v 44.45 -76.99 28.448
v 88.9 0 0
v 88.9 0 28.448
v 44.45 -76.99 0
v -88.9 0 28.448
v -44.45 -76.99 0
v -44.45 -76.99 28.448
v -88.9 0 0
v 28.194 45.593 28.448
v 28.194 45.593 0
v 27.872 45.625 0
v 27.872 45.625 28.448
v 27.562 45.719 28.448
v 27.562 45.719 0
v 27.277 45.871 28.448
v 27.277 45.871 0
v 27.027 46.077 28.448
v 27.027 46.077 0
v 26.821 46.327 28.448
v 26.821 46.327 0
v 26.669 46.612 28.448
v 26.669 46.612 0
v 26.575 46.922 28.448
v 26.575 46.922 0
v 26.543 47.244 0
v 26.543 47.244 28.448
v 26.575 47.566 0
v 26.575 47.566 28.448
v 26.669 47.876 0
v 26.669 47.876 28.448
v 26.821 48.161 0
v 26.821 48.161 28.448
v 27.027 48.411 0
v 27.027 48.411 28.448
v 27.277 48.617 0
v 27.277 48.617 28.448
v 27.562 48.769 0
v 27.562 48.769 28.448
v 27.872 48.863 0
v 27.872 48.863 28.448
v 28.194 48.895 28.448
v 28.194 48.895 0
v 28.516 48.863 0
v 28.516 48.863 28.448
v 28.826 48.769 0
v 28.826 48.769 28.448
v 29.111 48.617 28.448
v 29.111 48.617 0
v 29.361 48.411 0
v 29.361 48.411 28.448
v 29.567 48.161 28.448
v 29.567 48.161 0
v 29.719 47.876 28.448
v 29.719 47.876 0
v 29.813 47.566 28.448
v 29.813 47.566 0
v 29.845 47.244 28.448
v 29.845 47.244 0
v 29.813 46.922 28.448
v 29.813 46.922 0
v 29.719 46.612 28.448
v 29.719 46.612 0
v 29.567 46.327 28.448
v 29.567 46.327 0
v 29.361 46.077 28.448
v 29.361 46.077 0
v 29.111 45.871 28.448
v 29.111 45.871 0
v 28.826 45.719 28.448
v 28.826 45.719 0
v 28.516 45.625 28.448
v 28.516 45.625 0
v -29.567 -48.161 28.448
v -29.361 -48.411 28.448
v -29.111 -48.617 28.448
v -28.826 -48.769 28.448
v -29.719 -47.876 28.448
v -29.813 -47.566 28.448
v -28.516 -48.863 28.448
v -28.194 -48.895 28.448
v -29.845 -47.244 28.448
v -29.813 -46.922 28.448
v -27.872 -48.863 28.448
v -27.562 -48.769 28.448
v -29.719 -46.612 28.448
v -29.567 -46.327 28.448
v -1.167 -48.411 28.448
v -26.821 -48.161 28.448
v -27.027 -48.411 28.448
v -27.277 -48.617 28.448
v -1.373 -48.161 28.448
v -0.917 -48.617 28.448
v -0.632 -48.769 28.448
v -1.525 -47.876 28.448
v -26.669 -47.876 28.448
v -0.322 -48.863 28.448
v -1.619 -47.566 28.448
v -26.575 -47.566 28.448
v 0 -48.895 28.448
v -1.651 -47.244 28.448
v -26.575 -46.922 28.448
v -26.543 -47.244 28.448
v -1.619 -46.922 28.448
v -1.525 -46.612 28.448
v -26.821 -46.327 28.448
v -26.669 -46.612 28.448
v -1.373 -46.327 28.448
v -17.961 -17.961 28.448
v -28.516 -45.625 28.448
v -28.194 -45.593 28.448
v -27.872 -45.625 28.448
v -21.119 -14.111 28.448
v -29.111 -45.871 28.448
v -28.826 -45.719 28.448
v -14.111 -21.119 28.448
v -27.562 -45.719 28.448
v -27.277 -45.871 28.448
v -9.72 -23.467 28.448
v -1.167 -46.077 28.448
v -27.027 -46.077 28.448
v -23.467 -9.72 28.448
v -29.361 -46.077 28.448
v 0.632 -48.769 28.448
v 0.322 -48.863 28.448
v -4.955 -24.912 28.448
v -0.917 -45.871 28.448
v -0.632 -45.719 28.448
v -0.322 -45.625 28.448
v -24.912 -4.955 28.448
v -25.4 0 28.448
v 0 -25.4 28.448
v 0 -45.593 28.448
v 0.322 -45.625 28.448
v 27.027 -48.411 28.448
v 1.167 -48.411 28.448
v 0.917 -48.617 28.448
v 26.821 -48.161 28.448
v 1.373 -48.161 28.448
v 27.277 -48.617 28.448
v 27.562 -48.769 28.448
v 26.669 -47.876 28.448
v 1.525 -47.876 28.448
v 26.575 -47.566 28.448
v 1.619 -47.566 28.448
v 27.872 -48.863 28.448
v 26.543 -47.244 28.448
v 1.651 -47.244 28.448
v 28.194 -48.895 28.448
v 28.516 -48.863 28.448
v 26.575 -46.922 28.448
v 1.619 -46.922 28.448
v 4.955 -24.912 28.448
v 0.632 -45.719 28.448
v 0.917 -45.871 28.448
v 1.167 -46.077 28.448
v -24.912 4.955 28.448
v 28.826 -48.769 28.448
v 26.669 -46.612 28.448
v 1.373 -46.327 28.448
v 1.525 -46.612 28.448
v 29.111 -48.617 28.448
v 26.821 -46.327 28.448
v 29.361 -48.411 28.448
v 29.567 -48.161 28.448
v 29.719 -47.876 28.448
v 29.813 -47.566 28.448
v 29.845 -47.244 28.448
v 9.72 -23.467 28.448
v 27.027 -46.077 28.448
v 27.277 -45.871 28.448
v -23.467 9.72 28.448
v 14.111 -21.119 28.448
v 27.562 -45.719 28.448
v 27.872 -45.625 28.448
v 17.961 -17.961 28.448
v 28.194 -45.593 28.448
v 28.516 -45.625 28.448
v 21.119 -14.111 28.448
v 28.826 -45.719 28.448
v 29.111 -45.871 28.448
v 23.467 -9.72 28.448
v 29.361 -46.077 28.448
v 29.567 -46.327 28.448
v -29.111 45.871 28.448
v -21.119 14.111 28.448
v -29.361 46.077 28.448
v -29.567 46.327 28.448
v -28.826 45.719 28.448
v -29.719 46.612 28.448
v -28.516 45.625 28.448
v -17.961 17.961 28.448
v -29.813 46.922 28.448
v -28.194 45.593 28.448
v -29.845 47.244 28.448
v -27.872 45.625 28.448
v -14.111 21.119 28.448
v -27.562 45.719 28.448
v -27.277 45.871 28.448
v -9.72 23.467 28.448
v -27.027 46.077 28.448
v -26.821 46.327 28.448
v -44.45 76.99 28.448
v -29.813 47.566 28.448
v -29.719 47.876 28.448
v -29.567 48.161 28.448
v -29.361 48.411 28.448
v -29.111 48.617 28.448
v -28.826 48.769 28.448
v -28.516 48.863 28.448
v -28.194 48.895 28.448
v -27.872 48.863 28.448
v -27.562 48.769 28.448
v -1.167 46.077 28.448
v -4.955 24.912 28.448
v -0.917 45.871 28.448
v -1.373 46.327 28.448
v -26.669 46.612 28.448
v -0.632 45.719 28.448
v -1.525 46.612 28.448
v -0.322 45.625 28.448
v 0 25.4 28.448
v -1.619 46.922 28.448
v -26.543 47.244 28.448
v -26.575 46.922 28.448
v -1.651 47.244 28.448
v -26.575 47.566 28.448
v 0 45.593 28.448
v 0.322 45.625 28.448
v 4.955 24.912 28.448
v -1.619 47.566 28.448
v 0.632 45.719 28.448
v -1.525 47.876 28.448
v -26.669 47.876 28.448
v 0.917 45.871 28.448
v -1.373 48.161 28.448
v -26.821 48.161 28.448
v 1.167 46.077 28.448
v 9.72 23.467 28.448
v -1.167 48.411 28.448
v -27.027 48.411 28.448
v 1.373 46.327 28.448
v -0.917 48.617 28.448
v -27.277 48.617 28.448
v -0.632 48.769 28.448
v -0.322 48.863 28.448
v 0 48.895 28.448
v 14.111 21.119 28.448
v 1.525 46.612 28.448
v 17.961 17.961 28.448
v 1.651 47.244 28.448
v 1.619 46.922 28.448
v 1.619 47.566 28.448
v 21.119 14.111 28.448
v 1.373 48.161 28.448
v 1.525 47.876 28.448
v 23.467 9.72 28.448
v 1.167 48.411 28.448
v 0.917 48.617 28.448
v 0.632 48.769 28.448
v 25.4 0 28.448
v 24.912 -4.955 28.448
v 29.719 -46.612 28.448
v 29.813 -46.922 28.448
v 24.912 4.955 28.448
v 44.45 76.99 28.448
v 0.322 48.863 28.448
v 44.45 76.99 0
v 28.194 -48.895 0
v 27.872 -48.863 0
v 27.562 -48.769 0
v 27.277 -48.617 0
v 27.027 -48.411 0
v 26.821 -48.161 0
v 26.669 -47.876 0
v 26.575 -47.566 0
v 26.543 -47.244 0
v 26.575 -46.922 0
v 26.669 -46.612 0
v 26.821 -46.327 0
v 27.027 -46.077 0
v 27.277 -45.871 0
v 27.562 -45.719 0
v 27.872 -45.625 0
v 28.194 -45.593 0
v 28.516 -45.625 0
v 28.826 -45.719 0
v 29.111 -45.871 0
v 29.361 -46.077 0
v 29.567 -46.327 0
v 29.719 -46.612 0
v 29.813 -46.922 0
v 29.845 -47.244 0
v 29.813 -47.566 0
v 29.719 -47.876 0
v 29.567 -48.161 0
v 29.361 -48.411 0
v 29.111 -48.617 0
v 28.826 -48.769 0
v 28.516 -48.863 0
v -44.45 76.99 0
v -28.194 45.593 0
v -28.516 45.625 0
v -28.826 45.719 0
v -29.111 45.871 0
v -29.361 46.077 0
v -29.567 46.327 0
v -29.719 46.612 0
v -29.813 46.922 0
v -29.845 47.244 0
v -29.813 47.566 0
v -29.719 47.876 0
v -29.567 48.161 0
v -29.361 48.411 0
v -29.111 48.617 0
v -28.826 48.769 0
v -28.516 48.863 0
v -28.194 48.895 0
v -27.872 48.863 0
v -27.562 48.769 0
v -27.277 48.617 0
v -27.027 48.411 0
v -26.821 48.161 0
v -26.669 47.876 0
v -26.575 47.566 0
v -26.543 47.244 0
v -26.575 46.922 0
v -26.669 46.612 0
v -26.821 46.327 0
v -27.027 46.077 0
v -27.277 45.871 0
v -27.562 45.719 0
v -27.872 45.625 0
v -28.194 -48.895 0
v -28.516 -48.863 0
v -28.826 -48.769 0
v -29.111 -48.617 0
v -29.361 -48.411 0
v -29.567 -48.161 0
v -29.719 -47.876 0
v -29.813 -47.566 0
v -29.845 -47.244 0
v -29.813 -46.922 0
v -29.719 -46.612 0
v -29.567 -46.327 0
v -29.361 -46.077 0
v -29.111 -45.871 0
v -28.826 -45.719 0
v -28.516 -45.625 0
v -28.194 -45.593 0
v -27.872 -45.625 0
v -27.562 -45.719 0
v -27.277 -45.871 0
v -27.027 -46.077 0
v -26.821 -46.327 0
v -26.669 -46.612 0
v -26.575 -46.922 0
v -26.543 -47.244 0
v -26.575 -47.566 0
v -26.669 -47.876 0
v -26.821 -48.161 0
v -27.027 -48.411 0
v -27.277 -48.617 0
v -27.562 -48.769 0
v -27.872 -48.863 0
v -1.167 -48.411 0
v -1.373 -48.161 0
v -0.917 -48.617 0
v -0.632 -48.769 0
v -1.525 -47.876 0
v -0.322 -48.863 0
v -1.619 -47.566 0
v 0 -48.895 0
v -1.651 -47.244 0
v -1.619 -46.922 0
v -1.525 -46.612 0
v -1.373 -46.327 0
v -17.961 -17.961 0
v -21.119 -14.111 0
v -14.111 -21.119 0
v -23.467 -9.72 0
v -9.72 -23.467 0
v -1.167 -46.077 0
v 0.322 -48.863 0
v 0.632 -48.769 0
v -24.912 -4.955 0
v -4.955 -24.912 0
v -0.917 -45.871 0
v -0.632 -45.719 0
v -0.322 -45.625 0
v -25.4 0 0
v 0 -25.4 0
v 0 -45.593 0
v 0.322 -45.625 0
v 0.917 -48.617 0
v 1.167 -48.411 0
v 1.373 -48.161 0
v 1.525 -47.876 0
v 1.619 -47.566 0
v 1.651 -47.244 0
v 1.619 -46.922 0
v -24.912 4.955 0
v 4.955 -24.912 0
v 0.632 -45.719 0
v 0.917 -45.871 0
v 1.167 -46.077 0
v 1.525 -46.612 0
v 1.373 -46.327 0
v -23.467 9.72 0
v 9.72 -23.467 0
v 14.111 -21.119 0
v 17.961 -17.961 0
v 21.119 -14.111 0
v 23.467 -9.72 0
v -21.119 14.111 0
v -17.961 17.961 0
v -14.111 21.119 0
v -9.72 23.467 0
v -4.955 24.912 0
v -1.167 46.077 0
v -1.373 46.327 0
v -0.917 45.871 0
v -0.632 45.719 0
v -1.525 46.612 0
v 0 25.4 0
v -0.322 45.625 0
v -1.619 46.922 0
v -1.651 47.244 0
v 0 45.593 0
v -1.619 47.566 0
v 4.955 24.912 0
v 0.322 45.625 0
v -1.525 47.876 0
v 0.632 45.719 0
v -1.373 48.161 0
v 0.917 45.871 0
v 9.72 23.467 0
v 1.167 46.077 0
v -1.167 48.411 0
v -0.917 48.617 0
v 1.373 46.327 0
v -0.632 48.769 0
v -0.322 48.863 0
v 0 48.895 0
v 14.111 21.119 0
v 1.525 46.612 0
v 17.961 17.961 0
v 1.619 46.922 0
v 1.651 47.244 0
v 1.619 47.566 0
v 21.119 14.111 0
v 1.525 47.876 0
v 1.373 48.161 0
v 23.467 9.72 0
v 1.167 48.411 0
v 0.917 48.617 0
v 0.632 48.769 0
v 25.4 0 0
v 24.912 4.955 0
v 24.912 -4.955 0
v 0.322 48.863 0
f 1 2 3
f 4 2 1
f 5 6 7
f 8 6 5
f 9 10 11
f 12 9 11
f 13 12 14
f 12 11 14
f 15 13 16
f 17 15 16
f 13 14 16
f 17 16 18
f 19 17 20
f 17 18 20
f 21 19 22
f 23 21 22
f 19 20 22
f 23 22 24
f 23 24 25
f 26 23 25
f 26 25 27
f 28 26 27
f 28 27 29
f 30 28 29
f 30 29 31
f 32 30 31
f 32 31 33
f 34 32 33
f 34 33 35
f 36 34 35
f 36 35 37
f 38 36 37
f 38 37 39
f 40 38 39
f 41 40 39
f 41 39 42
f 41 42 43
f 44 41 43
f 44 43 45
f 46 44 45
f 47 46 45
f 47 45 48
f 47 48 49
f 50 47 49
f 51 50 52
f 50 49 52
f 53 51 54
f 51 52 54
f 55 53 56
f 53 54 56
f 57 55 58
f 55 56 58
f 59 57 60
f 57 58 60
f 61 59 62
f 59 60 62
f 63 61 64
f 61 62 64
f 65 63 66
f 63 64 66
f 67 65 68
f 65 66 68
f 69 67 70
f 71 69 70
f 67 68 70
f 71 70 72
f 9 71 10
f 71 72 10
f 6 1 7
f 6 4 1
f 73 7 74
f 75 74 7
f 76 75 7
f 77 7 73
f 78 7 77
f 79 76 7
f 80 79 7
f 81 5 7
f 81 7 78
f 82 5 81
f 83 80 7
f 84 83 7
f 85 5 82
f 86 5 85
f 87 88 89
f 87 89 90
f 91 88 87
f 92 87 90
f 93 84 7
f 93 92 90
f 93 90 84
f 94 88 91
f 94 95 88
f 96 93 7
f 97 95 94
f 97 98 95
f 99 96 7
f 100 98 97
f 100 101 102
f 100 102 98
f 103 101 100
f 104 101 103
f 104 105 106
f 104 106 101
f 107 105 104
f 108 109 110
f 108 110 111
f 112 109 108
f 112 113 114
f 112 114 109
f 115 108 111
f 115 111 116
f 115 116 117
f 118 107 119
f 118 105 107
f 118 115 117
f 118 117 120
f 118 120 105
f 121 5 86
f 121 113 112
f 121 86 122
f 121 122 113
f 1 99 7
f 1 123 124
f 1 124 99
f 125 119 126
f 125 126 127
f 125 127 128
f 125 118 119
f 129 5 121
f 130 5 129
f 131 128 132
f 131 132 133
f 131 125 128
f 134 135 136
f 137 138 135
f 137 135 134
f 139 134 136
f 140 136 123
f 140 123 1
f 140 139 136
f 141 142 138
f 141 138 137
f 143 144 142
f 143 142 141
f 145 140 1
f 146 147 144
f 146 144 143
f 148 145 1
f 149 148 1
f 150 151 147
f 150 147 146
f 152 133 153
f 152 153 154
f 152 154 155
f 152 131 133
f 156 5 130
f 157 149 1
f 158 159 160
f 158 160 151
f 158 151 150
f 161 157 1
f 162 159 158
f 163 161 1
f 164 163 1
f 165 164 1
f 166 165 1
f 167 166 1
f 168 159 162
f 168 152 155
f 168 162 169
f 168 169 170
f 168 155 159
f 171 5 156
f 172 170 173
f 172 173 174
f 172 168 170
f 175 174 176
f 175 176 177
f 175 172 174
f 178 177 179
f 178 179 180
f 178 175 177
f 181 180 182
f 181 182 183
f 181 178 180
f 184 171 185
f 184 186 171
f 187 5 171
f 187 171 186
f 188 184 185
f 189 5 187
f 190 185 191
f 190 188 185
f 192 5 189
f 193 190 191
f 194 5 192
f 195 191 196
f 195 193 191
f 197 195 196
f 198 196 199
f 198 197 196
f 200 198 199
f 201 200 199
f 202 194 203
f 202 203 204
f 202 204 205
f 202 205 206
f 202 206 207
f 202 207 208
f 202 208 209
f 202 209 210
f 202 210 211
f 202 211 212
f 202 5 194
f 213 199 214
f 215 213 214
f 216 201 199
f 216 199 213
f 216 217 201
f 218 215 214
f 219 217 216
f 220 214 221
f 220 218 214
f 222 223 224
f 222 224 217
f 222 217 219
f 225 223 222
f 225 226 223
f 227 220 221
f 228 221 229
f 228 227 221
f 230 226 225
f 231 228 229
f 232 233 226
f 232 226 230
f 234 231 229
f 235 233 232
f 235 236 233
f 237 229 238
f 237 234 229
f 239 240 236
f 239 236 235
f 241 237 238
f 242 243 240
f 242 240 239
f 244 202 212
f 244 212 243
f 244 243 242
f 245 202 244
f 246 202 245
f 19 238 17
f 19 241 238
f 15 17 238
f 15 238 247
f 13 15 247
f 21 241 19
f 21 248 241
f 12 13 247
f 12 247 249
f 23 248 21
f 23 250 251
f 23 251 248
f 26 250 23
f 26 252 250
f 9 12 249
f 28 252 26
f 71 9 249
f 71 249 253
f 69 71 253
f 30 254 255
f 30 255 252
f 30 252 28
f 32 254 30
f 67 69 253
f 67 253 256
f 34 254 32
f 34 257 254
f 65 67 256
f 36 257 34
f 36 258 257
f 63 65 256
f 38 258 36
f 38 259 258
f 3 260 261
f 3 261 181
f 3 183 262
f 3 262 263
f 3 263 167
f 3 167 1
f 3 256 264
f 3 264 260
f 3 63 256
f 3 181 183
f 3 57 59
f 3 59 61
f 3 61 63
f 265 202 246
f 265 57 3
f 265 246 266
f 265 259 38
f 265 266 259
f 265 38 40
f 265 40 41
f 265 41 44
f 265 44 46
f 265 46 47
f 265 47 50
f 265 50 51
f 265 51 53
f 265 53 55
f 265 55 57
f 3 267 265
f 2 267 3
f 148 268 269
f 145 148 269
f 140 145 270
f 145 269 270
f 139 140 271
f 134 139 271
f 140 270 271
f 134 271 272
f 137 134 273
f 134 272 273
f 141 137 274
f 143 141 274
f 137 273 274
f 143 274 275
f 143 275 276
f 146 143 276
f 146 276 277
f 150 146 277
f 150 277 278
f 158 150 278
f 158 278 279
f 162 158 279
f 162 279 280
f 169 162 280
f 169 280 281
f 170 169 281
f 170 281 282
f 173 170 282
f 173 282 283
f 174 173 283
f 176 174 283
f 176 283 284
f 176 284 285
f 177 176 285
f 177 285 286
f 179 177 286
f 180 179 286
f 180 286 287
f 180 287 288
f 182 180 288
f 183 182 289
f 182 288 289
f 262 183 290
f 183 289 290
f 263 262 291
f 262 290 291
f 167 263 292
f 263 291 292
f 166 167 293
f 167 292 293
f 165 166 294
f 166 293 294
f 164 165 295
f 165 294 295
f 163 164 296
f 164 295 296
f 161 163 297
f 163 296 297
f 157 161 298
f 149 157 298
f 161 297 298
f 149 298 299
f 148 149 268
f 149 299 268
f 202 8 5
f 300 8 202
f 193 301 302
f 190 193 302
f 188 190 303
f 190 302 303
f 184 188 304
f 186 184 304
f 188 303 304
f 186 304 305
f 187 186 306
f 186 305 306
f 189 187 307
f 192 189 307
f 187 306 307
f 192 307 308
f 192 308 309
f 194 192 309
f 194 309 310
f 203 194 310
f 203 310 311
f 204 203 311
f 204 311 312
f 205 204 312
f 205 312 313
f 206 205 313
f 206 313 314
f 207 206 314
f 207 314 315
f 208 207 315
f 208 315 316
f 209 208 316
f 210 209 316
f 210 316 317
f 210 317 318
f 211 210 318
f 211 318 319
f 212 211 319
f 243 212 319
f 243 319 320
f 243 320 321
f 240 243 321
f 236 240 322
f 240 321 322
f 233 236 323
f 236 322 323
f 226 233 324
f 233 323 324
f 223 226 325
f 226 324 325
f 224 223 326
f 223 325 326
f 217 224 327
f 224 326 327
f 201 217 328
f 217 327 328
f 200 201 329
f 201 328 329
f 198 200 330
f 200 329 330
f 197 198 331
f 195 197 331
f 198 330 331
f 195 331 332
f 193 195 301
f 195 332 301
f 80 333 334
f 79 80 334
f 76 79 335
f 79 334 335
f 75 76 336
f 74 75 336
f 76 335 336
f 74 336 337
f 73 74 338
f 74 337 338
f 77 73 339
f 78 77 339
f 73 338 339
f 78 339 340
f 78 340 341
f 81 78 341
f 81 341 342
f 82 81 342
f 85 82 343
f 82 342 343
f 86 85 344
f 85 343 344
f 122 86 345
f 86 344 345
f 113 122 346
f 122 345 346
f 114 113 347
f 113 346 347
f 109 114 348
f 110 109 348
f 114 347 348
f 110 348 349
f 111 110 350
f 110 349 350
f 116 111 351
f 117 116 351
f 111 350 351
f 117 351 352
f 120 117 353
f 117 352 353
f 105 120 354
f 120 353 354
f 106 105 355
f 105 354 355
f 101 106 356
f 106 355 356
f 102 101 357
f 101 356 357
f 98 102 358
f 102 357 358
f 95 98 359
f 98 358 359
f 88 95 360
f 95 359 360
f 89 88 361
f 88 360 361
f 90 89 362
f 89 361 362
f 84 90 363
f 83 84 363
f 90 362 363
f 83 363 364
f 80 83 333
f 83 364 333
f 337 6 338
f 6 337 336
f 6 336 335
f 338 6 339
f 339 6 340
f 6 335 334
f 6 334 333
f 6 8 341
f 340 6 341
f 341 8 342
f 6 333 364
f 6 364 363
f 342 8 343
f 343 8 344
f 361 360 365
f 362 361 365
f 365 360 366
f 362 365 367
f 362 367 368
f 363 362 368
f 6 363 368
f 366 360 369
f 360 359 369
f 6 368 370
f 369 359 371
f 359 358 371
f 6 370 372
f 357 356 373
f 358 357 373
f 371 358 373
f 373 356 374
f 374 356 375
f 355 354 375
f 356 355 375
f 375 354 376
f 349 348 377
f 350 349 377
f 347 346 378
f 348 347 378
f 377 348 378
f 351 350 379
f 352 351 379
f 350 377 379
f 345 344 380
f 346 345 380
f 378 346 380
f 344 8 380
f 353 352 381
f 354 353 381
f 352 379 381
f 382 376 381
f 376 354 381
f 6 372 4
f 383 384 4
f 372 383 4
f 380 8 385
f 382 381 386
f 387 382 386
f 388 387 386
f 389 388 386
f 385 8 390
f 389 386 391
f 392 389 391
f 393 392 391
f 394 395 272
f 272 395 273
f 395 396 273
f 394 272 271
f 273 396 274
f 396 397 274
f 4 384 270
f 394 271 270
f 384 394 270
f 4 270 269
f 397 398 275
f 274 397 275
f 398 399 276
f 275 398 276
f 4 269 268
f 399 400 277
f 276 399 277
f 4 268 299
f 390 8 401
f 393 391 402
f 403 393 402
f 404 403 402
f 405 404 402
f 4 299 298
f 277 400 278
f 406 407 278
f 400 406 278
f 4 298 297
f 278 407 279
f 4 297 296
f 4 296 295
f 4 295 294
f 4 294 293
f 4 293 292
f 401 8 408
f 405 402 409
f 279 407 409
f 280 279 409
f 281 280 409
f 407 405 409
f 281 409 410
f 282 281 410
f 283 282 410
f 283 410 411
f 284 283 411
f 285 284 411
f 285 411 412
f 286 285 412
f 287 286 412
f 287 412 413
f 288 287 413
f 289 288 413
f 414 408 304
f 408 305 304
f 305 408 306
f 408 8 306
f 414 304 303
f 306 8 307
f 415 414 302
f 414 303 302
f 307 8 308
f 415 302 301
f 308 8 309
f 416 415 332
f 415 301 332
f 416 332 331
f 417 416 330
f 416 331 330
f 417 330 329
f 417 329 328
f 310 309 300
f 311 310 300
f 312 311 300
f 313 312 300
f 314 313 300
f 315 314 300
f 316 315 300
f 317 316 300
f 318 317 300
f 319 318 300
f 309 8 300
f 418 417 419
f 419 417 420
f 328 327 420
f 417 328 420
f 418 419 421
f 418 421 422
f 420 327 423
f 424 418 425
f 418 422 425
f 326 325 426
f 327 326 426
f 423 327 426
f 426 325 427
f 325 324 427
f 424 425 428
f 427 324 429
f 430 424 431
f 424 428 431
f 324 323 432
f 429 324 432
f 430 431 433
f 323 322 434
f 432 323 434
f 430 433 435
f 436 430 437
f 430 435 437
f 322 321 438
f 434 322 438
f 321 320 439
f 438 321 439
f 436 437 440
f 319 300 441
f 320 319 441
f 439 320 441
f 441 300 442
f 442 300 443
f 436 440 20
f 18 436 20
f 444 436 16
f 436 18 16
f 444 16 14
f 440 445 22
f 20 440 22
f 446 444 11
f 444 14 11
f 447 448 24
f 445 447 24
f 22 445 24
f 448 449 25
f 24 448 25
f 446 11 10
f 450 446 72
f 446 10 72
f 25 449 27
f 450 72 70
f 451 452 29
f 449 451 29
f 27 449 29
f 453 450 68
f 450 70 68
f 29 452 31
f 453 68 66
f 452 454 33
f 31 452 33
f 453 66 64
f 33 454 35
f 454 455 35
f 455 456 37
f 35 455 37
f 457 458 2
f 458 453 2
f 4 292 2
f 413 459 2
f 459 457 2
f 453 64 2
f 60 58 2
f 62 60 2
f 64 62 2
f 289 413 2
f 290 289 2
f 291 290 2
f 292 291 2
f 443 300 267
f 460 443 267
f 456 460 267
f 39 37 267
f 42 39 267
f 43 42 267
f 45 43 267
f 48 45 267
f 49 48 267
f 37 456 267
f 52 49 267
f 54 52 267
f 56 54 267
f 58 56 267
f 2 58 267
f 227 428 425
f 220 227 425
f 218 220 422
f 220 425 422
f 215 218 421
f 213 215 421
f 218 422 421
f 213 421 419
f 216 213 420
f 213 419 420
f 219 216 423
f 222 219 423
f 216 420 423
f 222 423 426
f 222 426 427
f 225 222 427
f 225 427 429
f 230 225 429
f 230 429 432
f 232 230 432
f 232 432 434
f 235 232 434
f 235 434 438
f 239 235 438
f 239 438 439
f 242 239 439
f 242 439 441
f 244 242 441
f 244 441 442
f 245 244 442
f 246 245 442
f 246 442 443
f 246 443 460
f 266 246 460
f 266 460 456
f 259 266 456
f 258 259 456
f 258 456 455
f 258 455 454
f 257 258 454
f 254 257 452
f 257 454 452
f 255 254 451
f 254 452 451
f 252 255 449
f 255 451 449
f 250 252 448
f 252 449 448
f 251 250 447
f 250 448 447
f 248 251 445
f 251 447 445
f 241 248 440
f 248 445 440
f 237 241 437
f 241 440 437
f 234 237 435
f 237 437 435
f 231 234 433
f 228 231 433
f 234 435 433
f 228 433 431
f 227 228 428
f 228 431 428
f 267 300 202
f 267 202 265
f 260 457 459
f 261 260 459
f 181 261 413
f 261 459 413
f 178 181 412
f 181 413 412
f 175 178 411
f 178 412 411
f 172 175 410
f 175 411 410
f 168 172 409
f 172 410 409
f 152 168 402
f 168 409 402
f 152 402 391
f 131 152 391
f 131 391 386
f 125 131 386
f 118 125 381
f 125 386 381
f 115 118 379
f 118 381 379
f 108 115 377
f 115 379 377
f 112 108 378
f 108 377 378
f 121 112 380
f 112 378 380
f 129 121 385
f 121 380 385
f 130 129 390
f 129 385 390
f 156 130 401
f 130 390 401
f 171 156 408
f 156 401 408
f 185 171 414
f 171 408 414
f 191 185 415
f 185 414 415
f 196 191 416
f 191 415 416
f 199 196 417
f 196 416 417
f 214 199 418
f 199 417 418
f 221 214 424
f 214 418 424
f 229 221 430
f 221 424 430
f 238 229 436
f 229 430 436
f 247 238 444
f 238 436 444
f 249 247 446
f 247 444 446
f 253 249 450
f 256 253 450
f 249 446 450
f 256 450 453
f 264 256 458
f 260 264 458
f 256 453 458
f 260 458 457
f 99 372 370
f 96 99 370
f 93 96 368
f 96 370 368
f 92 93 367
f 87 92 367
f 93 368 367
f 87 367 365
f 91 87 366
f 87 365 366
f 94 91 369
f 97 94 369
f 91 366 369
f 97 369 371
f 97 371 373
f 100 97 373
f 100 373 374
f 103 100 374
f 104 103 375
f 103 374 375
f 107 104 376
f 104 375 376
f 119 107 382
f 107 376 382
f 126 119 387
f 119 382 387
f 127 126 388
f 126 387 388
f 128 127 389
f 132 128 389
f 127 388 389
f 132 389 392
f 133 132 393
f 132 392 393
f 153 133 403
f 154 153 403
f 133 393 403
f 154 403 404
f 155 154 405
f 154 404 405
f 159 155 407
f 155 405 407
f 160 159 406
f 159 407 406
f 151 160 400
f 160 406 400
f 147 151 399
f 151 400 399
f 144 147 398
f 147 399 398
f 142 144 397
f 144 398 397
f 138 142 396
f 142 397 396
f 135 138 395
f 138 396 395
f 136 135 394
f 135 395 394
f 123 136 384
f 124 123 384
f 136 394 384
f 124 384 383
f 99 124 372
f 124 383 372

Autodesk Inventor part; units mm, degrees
ref_plane "YZ Plane" through (0, 0, 0) normal (1, 0, 0) x (0, 1, 0)
ref_plane "XZ Plane" through (0, 0, 0) normal (0, 1, 0) x (-1, 0, 0)
ref_plane "XY Plane" through (0, 0, 0) normal (0, 0, 1) x (1, 0, 0)
sketch "Sketch1" plane through (0, 0, 0) normal (0, 0, 1) x (1, 0, 0)
  line L0 (44.45, -76.9897) -> (-44.45, -76.9897)
  line L1 (-44.45, -76.9897) -> (-88.9, 0)
  line L2 (-88.9, 0) -> (-44.45, 76.9897)
  line L3 (-44.45, 76.9897) -> (44.45, 76.9897)
  line L4 (44.45, 76.9897) -> (88.9, 0)
  line L5 (88.9, 0) -> (44.45, -76.9897)
  circle A0 centre (0, 0) radius 25.4
  line L6 (0, 107.7855) -> (0, -107.7855) projected
  line L7 (-124.46, 0) -> (124.46, 0) projected
  point P0 (0, 0)
  point P1 (0, 0)
  dimension "d1" = 88.9
  dimension "d4" = 50.8
  dimension "d7" = 88.9
  dimension "d8" = 88.9
  dimension "d9" = 88.9
  dimension "d10" = 120
  dimension "d11" = 120
  dimension "d12" = 120
  dimension "d13" = 120
  dimension "d14" = 120
  dimension "d15" = 44.45
extrude "Extrusion1" add sketch "Sketch1" along normal blind 28.448
sketch "Sketch2" plane through (0, 0, 0) normal (0, 0, -1) x (-1, 0, 0)
  line L0 (-44.45, -76.9897) -> (44.45, -76.9897) projected
  line L1 (44.45, -76.9897) -> (88.9, 0) projected
  line L2 (88.9, 0) -> (44.45, 76.9897) projected
  line L3 (44.45, 76.9897) -> (-44.45, 76.9897) projected
  line L4 (-44.45, 76.9897) -> (-88.9, 0) projected
  line L5 (-88.9, 0) -> (-44.45, -76.9897) projected
  circle A0 centre (0, 0) radius 25.4 projected
  point P0 (0, 0)
  point P1 (0, 0)
extrude "Extrusion2" cut sketch "Sketch1" along normal blind 44.45 contours L6 L7 A0 | A0 L7 L6 | L7 L6 A0 | A0 L6 L7
sketch "Sketch3" plane through (0, 0, 28.448) normal (0, 0, 1) x (1, 0, 0)
  line L0 (0, 107.7855) -> (0, -107.7855) projected
  line L1 (-124.46, 0) -> (124.46, 0) projected
  line L2 (28.194, 47.244) -> (28.194, -47.244) construction
  line L3 (28.194, -47.244) -> (-28.194, -47.244) construction
  line L4 (-28.194, -47.244) -> (-28.194, 47.244) construction
  line L5 (-28.194, 47.244) -> (28.194, 47.244) construction
  line L6 (28.194, 47.244) -> (-28.194, -47.244) construction
  line L7 (28.194, -47.244) -> (-28.194, 47.244) construction
  point P0 (0, 0)
  point P1 (0, 47.244)
  point P2 (0, -47.244)
  dimension "d16" = 56.388
  dimension "d17" = 94.488
  dimension "d18" = 0
hole "Hole1" at (-28.194, 47.244, 28.448) at (28.194, 47.244, 28.448) at (28.194, -47.244, 28.448) at (-28.194, -47.244, 28.448) at (0, 47.244, 28.448) at (0, -47.244, 28.448) direction (0, 0, -1) diameter 3.302 end through all thread size "8-32 UNC" class "2B" standard "ANSI Unified Screw Threads"
properties part number "JF-AT-TM0009" material "Acrylic, Clear"
